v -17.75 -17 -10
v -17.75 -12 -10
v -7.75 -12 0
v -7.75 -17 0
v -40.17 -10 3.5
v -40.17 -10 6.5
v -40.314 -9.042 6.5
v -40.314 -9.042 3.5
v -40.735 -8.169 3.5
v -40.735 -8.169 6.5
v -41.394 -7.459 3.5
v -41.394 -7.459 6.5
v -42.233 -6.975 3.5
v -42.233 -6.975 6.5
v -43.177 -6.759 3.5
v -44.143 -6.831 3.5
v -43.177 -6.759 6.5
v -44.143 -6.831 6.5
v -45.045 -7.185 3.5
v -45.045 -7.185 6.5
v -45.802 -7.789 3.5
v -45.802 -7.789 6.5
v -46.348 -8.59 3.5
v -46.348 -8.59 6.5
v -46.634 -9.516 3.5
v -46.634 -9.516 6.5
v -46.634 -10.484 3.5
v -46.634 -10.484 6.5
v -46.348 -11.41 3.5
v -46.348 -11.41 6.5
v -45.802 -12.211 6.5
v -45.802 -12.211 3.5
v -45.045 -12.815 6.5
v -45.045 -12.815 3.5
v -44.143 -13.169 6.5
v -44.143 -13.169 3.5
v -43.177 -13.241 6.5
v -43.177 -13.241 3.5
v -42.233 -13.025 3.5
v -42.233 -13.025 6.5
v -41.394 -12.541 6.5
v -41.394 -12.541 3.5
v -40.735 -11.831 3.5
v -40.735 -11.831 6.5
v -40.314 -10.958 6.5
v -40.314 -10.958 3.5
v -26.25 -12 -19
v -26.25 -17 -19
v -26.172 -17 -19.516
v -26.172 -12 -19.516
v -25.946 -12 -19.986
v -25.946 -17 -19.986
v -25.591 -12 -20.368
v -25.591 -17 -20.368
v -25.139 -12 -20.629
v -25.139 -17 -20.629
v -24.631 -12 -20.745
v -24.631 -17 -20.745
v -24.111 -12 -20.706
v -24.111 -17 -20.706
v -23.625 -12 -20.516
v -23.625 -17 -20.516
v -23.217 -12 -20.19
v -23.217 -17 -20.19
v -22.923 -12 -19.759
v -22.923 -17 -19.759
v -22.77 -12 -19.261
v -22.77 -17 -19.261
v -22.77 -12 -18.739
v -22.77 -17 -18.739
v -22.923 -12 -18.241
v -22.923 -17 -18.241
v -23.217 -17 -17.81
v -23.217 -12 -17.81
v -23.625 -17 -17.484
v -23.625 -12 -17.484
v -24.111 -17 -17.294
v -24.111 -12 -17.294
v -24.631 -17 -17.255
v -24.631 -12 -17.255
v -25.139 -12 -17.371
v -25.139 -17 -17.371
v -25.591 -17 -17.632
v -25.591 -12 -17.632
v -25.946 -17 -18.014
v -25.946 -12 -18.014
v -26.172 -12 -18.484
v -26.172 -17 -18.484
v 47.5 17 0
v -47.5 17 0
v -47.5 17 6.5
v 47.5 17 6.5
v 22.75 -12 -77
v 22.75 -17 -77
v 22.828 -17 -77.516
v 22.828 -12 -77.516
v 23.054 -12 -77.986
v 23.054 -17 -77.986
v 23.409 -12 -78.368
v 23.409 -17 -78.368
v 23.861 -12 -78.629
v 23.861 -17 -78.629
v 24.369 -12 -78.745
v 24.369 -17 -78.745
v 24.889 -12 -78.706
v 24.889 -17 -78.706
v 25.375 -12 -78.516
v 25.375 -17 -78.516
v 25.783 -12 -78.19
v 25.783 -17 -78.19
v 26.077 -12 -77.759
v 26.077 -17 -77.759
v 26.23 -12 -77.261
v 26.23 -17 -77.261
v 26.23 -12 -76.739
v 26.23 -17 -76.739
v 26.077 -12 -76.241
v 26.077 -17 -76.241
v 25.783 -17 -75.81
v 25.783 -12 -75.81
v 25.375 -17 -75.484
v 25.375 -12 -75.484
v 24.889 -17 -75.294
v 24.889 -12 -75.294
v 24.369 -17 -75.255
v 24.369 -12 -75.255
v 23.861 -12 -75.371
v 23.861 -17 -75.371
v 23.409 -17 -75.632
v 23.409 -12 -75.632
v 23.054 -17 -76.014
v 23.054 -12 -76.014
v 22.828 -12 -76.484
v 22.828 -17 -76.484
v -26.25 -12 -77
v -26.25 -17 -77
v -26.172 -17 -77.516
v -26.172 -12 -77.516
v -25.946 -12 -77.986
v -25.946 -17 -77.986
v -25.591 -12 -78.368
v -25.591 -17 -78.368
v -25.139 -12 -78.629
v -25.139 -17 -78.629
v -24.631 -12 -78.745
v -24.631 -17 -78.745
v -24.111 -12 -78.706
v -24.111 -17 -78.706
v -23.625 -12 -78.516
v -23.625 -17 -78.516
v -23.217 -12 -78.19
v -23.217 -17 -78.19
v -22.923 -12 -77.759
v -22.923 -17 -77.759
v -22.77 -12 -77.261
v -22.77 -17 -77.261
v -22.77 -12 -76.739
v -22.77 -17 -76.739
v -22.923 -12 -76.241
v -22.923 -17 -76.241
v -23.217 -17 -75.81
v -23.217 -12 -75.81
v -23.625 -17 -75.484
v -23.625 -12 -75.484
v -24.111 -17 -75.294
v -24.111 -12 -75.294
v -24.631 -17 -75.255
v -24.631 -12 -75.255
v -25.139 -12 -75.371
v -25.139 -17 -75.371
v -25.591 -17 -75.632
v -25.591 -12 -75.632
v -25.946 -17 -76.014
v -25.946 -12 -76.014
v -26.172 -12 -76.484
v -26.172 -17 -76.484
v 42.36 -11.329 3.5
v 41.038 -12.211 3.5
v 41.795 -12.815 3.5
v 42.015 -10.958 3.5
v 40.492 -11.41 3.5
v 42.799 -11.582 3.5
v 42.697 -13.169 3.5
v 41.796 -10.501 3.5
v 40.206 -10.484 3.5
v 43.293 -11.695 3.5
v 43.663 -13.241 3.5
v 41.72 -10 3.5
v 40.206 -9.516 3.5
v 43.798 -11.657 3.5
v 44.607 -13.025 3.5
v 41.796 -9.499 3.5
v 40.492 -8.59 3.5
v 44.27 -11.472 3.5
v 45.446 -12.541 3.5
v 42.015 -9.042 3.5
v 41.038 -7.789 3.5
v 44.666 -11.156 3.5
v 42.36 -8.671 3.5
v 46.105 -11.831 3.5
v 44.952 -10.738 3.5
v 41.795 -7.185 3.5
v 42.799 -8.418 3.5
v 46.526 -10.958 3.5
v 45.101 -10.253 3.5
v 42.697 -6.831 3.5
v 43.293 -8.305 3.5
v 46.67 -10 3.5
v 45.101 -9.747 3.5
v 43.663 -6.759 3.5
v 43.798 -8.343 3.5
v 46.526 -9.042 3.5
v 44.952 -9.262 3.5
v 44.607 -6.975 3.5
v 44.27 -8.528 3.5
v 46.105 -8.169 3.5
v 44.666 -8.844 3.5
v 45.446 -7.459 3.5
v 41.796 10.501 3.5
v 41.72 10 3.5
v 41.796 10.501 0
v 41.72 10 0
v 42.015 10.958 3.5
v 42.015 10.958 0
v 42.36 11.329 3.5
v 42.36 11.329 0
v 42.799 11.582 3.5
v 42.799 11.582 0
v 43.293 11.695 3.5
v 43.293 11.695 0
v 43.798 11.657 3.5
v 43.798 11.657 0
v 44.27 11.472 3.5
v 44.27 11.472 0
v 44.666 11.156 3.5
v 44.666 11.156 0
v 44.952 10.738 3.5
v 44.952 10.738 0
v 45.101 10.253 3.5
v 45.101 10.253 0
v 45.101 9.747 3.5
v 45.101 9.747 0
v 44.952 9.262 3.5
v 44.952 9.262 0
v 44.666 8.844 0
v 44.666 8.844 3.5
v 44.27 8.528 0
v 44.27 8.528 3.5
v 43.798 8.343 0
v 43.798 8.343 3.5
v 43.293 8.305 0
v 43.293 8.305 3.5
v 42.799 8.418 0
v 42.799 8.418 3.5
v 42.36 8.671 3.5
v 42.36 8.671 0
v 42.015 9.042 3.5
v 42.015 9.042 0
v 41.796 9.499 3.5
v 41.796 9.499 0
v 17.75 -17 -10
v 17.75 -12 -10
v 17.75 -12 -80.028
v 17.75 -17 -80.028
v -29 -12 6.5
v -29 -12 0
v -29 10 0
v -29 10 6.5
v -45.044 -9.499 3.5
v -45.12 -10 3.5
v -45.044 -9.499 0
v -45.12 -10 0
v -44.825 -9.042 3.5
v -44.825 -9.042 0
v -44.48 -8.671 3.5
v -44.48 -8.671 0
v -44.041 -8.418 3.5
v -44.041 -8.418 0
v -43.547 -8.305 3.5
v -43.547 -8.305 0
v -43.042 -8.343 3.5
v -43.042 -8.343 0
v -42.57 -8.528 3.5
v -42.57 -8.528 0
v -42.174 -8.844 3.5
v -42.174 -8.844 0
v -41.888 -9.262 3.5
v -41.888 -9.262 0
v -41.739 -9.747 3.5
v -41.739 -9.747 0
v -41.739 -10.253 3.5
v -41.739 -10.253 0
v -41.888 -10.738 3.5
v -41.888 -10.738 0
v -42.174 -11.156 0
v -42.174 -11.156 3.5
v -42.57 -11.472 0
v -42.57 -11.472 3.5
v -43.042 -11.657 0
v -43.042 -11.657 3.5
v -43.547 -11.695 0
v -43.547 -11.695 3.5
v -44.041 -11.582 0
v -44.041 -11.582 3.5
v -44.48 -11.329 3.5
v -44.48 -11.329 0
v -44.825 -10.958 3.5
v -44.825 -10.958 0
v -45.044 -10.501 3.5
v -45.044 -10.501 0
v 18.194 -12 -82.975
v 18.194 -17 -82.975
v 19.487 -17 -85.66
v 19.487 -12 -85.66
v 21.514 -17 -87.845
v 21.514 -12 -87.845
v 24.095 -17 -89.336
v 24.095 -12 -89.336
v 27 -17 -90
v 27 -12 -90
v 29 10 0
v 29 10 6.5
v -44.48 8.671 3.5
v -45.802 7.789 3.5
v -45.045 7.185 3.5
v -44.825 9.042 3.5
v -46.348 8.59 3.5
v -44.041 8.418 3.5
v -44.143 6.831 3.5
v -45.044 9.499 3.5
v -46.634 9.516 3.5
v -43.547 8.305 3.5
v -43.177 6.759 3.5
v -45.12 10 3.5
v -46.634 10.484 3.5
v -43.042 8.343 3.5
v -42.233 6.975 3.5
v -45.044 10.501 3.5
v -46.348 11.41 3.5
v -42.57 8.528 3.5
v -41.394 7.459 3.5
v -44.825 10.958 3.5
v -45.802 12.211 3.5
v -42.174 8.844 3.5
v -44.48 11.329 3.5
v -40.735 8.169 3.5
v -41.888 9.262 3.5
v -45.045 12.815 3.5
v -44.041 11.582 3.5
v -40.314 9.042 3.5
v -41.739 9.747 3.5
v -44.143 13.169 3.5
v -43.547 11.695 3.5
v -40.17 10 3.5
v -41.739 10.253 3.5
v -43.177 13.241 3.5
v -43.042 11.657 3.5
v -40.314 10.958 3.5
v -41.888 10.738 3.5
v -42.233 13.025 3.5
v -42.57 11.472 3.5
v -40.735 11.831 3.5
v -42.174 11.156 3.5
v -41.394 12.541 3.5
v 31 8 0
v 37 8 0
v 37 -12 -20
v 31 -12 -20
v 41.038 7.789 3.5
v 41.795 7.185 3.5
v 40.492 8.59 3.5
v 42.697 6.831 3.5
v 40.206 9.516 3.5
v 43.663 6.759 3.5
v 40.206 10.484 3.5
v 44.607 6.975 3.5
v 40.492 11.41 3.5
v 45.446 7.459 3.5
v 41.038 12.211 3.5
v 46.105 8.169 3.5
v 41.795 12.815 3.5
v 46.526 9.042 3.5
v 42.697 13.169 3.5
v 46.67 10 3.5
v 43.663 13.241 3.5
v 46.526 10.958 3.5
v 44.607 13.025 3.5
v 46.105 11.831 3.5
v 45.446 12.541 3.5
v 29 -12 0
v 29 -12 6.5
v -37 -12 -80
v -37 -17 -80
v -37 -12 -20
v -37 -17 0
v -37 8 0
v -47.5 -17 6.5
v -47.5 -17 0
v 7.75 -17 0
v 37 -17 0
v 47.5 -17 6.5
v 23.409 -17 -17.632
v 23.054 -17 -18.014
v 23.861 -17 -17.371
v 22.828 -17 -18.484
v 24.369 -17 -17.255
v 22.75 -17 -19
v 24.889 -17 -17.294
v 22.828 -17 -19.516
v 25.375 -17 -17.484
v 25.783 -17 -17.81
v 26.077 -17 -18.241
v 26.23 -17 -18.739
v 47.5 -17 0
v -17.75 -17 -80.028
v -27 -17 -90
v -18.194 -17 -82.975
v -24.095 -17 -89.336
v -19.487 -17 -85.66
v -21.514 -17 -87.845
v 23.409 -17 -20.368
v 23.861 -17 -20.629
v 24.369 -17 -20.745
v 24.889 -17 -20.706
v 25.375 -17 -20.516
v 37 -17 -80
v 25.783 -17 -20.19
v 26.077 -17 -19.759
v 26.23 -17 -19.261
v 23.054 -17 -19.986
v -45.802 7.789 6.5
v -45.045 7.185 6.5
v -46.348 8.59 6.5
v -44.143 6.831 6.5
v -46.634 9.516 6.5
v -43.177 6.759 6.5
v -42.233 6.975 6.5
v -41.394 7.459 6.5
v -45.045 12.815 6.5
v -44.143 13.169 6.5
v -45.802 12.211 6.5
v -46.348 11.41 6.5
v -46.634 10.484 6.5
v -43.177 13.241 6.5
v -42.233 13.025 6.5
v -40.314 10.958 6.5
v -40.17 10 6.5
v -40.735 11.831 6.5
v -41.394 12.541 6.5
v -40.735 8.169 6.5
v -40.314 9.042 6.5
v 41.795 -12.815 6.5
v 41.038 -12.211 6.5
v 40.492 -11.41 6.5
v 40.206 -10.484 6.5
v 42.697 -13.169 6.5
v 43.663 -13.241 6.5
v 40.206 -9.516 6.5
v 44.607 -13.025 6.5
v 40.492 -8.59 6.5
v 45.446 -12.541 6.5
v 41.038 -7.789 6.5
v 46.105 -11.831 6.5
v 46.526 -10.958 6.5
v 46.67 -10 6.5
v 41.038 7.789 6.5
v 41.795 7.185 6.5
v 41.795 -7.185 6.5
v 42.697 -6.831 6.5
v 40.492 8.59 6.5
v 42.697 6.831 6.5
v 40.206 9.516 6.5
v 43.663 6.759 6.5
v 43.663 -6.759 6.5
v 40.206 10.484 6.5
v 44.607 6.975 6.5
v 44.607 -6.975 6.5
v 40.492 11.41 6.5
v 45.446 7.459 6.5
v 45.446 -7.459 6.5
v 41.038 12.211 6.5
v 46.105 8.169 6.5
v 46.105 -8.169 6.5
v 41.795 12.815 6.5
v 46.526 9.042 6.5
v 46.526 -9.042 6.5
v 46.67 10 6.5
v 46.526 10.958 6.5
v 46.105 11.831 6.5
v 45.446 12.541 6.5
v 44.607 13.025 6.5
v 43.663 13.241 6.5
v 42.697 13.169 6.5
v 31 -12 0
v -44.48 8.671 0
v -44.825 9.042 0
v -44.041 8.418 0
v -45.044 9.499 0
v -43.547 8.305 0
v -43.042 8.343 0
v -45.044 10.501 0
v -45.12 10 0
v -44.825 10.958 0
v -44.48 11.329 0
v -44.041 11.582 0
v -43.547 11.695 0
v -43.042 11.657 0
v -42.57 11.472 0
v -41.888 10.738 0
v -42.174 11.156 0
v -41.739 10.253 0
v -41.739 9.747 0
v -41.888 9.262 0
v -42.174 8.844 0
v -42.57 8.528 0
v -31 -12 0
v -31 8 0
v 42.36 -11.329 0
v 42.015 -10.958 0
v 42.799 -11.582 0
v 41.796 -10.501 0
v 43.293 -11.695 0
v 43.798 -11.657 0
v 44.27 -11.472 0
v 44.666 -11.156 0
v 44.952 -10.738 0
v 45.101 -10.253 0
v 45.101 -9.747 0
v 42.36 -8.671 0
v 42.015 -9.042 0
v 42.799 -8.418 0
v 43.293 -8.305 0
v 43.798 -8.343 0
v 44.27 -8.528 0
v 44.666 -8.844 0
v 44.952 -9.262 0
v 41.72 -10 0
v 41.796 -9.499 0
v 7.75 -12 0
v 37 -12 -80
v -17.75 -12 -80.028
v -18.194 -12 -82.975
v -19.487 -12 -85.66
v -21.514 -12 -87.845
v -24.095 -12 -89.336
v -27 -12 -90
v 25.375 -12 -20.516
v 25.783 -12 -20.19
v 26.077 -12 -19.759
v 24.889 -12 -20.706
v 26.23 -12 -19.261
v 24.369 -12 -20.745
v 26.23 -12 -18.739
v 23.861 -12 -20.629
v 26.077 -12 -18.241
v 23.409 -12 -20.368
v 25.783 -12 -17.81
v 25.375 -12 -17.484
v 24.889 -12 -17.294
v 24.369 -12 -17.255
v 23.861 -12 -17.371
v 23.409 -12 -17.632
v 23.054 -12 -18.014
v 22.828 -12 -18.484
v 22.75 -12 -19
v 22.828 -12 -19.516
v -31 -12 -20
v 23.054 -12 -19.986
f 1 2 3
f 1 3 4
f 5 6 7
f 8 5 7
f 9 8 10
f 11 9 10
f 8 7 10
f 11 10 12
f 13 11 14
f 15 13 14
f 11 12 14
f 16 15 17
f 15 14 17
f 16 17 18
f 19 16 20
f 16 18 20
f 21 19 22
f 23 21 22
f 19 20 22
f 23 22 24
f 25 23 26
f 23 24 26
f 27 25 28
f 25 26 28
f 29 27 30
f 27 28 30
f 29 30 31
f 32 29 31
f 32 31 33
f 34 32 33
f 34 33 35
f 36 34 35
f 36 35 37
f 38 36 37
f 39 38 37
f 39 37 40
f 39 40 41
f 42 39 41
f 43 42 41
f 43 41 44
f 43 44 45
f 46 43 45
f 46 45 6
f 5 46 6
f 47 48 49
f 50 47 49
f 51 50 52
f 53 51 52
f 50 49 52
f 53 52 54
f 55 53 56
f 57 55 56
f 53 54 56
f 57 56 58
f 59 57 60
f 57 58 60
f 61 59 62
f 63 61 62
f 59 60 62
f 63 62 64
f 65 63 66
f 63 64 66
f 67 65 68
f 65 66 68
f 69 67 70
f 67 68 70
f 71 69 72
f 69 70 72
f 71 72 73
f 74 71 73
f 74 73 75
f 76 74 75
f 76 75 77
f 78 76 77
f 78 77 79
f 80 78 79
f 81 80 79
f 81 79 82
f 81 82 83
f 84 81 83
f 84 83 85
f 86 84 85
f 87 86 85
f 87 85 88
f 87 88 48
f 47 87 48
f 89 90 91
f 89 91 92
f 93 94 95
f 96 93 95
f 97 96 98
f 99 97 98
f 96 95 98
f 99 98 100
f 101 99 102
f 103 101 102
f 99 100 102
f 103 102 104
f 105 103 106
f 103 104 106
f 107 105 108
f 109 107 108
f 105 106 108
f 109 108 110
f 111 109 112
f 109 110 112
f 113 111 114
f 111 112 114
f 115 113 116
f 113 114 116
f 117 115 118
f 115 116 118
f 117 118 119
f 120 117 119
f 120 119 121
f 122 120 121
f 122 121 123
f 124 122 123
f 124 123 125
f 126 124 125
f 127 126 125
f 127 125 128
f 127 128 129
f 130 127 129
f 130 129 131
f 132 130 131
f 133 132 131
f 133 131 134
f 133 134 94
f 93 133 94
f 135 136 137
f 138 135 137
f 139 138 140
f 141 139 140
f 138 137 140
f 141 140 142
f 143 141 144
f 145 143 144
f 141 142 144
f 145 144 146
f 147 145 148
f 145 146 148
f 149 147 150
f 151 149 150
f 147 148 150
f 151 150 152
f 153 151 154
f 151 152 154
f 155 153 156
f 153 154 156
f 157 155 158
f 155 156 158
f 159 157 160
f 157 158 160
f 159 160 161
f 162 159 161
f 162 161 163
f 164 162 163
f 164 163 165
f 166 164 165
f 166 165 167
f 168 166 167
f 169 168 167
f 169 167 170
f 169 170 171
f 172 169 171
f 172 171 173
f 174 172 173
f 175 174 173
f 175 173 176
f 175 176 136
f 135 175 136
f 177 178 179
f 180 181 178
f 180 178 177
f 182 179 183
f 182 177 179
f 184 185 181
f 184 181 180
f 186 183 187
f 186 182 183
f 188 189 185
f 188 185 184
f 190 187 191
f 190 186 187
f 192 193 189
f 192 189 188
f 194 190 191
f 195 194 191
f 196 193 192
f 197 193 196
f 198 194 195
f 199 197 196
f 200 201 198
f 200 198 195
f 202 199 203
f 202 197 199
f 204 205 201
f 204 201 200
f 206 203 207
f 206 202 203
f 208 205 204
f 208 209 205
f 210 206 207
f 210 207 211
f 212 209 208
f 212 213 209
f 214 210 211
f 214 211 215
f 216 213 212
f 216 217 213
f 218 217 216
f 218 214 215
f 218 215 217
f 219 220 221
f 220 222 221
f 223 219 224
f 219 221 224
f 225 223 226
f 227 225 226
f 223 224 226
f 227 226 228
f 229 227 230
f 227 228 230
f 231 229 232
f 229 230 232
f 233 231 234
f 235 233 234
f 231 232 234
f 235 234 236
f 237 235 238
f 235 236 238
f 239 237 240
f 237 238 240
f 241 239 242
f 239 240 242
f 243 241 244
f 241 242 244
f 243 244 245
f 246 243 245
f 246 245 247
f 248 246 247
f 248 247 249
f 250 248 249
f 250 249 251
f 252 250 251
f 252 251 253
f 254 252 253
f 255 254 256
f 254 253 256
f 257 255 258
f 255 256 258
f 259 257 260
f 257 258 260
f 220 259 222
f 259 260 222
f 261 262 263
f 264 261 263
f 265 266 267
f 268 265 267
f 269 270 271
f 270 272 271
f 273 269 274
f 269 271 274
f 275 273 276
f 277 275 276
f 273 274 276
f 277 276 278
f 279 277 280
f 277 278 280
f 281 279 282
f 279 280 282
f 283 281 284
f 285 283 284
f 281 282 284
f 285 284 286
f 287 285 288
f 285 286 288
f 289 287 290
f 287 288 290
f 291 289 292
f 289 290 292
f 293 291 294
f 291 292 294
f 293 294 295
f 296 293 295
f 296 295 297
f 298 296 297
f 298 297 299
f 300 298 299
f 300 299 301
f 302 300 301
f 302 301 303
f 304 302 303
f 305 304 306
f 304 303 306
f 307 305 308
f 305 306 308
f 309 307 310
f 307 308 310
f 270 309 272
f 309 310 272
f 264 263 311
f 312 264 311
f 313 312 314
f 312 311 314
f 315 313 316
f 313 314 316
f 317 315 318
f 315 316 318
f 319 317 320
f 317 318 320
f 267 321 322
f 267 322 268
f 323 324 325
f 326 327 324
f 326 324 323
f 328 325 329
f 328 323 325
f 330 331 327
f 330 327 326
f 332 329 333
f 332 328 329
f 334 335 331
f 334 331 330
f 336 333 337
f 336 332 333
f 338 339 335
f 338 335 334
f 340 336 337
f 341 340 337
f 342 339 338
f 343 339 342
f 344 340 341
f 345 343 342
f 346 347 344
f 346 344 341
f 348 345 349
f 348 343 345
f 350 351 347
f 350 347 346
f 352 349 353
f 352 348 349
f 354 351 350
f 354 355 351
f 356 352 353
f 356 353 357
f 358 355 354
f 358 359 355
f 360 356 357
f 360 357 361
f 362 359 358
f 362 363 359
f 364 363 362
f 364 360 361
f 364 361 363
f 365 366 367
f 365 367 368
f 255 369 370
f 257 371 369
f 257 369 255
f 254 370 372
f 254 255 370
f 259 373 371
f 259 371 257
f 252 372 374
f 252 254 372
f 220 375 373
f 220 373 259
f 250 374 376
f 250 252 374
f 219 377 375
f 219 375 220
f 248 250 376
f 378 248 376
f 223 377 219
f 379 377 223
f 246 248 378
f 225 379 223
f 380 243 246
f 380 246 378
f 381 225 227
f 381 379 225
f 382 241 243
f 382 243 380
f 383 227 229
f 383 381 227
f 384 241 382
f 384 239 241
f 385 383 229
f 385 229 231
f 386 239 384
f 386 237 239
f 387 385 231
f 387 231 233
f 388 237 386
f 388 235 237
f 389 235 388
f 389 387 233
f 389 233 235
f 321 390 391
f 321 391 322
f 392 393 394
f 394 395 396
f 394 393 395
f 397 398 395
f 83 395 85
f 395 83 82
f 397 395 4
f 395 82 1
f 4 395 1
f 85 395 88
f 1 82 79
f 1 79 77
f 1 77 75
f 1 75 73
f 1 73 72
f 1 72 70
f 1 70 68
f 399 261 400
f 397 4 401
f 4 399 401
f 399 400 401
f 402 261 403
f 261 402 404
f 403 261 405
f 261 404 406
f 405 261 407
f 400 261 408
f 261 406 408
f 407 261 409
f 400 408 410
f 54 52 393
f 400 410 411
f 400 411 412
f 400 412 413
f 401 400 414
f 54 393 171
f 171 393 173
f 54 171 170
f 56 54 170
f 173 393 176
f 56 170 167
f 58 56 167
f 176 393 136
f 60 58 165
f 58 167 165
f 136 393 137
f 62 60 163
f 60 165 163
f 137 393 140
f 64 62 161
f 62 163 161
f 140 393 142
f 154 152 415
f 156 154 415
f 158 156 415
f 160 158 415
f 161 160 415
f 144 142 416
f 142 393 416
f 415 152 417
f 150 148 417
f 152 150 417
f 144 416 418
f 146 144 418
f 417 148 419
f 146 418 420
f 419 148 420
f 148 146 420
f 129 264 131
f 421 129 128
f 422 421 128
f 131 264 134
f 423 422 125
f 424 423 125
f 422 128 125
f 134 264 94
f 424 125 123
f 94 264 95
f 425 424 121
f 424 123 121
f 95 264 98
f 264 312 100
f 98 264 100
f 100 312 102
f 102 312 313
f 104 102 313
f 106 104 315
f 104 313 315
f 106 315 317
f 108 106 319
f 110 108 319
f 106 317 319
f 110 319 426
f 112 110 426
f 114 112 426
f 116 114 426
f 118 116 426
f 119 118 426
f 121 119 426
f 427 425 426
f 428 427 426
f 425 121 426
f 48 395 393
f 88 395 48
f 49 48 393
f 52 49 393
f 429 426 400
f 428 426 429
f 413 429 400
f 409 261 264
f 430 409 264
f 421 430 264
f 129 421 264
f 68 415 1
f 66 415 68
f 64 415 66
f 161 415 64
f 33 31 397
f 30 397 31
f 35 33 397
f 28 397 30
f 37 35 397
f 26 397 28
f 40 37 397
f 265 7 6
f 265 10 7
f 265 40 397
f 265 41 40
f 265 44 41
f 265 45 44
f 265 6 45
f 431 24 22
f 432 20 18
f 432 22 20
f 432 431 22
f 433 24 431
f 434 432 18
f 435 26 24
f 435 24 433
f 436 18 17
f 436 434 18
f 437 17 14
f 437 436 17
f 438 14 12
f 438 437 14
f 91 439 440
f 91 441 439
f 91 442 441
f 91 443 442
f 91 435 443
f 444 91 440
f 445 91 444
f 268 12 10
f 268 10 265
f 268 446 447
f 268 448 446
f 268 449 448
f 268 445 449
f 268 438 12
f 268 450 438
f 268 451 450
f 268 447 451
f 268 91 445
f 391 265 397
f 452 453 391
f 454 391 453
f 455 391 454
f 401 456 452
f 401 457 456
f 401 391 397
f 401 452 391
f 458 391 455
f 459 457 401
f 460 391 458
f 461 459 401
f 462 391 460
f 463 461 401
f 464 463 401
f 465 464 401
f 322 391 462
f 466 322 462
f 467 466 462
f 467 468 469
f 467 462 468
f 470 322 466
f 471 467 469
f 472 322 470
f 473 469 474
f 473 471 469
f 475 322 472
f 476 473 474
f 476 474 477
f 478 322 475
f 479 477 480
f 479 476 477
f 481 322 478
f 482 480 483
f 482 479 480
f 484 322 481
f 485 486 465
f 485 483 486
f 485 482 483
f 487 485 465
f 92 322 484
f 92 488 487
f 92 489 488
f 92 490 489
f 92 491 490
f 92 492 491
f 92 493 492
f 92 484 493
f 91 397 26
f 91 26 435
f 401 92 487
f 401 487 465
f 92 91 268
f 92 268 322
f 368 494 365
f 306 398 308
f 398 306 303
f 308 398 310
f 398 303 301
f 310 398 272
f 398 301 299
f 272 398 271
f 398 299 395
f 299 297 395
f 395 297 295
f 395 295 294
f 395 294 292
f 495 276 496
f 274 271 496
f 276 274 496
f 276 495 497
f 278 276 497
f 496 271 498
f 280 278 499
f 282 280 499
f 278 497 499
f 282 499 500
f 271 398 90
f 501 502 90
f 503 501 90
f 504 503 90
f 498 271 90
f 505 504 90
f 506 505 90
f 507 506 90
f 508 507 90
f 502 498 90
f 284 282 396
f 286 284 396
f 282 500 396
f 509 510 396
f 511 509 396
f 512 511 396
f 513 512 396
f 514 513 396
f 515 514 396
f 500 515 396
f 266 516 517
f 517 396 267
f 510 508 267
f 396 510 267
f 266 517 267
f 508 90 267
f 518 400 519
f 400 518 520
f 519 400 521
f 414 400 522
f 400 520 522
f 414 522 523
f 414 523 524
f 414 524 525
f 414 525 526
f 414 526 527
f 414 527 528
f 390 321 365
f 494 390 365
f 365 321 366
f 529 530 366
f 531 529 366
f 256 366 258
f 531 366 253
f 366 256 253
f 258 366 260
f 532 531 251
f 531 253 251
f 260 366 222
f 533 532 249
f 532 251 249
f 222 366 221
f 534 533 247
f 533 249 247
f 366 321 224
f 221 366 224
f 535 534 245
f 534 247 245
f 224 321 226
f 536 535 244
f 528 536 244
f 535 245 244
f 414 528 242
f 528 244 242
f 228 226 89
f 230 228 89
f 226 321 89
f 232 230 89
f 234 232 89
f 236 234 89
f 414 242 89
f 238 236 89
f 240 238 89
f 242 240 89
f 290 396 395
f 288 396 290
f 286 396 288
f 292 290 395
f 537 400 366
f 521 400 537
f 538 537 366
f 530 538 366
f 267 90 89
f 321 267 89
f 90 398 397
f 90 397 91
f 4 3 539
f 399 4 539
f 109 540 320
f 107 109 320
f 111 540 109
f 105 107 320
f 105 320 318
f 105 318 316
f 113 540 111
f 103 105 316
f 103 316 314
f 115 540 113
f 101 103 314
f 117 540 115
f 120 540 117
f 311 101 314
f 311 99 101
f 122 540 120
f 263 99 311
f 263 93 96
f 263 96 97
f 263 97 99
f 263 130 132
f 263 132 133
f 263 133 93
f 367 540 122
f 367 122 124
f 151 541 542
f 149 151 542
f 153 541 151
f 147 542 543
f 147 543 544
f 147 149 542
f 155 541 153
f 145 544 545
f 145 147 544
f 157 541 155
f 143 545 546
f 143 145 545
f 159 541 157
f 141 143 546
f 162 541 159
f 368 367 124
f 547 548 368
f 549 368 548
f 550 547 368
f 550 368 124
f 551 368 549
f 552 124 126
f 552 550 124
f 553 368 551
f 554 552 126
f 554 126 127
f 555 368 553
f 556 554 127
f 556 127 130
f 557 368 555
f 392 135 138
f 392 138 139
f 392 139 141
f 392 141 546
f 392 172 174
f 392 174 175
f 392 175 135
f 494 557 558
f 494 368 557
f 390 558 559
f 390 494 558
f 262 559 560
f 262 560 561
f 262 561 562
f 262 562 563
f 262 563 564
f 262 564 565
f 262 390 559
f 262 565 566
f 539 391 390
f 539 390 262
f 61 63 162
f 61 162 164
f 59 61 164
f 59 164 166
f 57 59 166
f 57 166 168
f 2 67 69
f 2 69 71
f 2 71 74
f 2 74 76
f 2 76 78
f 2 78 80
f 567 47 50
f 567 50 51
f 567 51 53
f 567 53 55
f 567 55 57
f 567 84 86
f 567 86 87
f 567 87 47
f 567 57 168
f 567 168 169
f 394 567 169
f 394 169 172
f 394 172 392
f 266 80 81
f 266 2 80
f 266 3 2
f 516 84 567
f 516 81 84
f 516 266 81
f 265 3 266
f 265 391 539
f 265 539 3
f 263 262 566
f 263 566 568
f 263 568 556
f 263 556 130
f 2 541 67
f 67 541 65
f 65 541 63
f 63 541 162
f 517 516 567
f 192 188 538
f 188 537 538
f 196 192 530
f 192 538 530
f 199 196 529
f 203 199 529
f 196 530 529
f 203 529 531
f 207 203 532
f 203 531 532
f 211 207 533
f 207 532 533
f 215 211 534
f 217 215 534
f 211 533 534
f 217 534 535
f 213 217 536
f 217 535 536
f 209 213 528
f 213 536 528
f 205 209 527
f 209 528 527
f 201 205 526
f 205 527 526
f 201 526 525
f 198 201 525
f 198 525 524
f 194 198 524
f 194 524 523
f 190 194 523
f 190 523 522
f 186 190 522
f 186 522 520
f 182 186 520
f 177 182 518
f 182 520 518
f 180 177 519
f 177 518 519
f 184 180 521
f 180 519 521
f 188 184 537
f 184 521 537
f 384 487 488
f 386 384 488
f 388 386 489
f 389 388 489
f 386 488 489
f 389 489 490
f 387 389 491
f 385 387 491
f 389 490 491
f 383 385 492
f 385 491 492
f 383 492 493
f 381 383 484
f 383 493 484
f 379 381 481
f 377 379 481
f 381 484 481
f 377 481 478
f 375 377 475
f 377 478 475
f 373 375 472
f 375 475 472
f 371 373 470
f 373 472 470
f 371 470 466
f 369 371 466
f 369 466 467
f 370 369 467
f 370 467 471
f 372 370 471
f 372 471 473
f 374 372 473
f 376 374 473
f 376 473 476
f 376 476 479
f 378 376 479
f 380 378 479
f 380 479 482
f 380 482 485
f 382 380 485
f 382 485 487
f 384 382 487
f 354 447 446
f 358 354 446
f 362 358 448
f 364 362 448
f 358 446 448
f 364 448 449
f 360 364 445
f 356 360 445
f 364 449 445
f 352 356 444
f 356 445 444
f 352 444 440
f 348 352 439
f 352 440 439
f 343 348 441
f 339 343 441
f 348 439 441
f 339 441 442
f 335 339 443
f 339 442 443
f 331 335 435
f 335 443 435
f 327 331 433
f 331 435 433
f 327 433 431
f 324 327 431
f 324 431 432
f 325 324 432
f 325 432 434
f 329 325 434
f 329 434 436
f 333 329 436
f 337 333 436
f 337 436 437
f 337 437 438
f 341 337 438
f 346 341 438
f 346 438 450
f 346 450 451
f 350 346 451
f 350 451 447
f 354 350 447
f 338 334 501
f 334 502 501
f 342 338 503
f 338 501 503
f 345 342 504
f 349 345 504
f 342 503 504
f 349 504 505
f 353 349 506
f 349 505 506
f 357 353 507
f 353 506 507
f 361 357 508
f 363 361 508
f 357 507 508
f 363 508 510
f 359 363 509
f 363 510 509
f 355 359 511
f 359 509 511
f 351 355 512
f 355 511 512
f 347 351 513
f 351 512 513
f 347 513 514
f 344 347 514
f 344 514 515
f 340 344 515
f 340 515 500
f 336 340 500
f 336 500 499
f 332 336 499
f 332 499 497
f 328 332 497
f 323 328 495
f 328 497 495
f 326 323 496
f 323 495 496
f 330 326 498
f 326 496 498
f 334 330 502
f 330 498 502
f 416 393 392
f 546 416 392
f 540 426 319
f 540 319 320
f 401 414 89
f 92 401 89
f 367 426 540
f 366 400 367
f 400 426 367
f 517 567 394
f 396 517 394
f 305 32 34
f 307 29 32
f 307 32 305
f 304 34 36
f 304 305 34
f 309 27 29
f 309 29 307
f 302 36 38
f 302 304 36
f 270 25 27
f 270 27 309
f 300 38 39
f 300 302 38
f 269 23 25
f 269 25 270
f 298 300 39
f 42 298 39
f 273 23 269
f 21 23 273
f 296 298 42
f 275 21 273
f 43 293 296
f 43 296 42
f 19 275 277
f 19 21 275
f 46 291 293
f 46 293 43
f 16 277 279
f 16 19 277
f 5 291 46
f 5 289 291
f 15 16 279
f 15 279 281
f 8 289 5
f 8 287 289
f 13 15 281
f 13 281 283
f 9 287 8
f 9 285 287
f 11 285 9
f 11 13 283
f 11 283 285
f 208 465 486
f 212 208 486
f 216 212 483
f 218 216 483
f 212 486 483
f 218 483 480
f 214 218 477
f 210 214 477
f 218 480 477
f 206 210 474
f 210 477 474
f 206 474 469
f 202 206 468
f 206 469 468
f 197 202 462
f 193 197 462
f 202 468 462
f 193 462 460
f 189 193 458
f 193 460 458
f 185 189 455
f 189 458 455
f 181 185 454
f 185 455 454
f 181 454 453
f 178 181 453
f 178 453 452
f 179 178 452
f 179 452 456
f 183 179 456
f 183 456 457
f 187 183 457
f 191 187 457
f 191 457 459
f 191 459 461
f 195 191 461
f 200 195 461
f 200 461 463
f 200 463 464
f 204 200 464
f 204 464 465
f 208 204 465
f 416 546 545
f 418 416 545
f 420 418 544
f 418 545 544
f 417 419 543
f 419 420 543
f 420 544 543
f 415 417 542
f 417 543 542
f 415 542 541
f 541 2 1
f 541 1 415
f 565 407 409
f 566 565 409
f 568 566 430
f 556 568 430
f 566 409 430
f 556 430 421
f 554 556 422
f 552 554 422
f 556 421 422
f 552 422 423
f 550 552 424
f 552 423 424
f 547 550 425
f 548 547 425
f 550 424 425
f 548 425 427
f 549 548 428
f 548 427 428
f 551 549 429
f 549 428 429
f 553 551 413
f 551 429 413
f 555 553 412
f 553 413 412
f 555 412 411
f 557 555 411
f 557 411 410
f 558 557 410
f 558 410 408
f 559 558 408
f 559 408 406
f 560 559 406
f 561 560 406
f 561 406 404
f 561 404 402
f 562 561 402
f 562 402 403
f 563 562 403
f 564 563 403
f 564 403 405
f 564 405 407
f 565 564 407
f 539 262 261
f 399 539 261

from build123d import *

# Parameters (mm, degrees)
SKETCH1_W                      = 95
SKETCH1_H                      = 34
BOSS_EXTRUDE1_DEPTH            = 6.5
SKETCH2_W                      = 74
SKETCH2_H                      = 5
BOSS_EXTRUDE2_DEPTH            = 90
SKETCH3_W                      = 58
SKETCH3_H                      = 22
CUT_EXTRUDE1_DEPTH             = 90
CBORE_FOR_M3_SHCS1_D           = 3.4
CBORE_FOR_M3_SHCS1_DEPTH       = 10.1
CBORE_FOR_M3_SHCS1_CBORE_D     = 6.5
CBORE_FOR_M3_SHCS1_CBORE_DEPTH = 3
CBORE_FOR_M3_SHCS1_TIP         = 1.021463052
SKETCH7_W                      = 6
SKETCH7_H                      = 20
BOSS_EXTRUDE3_DEPTH            = 20
CHAMFER1_SIZE                  = 20
F_1_0_3_5_DIAMETER_HOLE1_D     = 3.5
F_1_0_3_5_DIAMETER_HOLE1_DEPTH = 10.1
F_1_0_3_5_DIAMETER_HOLE1_TIP   = 1.051506083
SKETCH12_W                     = 35.5
SKETCH12_H                     = 90
CUT_EXTRUDE2_DEPTH             = 20
CHAMFER2_SIZE                  = 10
FILLET1_R                      = 10


# Some blends are built 0.0001 mm under size
with BuildPart() as part:
    # Sketch1 → Boss-Extrude1 (new body)
    with BuildSketch(Plane.XY):
        Rectangle(SKETCH1_W, SKETCH1_H)
    extrude(amount=BOSS_EXTRUDE1_DEPTH)

    # Sketch2 → Boss-Extrude2 (add)
    with BuildSketch(Plane(origin=(0, 0, 0), x_dir=(-1, 0, 0), z_dir=(0, 0, -1))):
        with Locations((0, -14.5)):
            Rectangle(SKETCH2_W, SKETCH2_H)
    extrude(amount=BOSS_EXTRUDE2_DEPTH)

    # Sketch3 → Cut-Extrude1 (cut)
    with BuildSketch(Plane(origin=(0, 0, 0), x_dir=(-1, 0, 0), z_dir=(0, 0, -1))):
        with Locations((0, -1)):
            Rectangle(SKETCH3_W, SKETCH3_H)
    extrude(amount=-CUT_EXTRUDE1_DEPTH, mode=Mode.SUBTRACT)

    # CBORE for M3 SHCS1
    with Locations(Plane.XY.offset(6.5)):
        with Locations((-43.42, 10), (-43.42, -10), (43.42, 10), (43.42, -10)):
            CounterBoreHole(CBORE_FOR_M3_SHCS1_D / 2, CBORE_FOR_M3_SHCS1_CBORE_D / 2, CBORE_FOR_M3_SHCS1_CBORE_DEPTH, depth=CBORE_FOR_M3_SHCS1_DEPTH)
            with Locations((0, 0, -(CBORE_FOR_M3_SHCS1_DEPTH + CBORE_FOR_M3_SHCS1_TIP / 2))):  # 118° drill point
                Cone(0, CBORE_FOR_M3_SHCS1_D / 2, CBORE_FOR_M3_SHCS1_TIP, mode=Mode.SUBTRACT)

    # Sketch7 → Boss-Extrude3 (add)
    with BuildSketch(Plane(origin=(0, 0, 0), x_dir=(-1, 0, 0), z_dir=(0, 0, -1))):
        with Locations((-34, -2)):
            Rectangle(SKETCH7_W, SKETCH7_H)
        with Locations((34, -2)):
            Rectangle(SKETCH7_W, SKETCH7_H)
    extrude(amount=BOSS_EXTRUDE3_DEPTH)

    # Chamfer1
    chamfer1_edges = [part.edges().sort_by_distance(p)[0] for p in [
        (34, 8, -20),
        (-34, 8, -20),
    ]]
    chamfer(chamfer1_edges, length=CHAMFER1_SIZE - 0.0001)  # a hair under: the kernel refuses the full size

    # Ø1.0 (3.5) Diameter Hole1
    with Locations(Plane(origin=(0, -12, 0), x_dir=(1, 0, 0), z_dir=(0, 1, 0))):
        with Locations((-24.5, 77), (24.5, 77), (-24.5, 19), (24.5, 19)):
            Hole(F_1_0_3_5_DIAMETER_HOLE1_D / 2, depth=F_1_0_3_5_DIAMETER_HOLE1_DEPTH)
            with Locations((0, 0, -(F_1_0_3_5_DIAMETER_HOLE1_DEPTH + F_1_0_3_5_DIAMETER_HOLE1_TIP / 2))):  # 118° drill point
                Cone(0, F_1_0_3_5_DIAMETER_HOLE1_D / 2, F_1_0_3_5_DIAMETER_HOLE1_TIP, mode=Mode.SUBTRACT)

    # Sketch12 → Cut-Extrude2 (cut)
    with BuildSketch(Plane(origin=(0, -12, 0), x_dir=(1, 0, 0), z_dir=(0, 1, 0))):
        with Locations((0, 45)):
            Rectangle(SKETCH12_W, SKETCH12_H)
    extrude(amount=-CUT_EXTRUDE2_DEPTH, mode=Mode.SUBTRACT)

    # Chamfer2
    chamfer2_edges = [part.edges().sort_by_distance(p)[0] for p in [
        (17.75, -14.5, 0),
        (-17.75, -14.5, 0),
        (37, -14.5, -90),
        (-37, -14.5, -90),
    ]]
    chamfer(chamfer2_edges, length=CHAMFER2_SIZE)

    # Fillet1
    # the kernel refuses this fillet: 10 mm, written as the material it takes off along each edge
    with BuildSketch(Plane(origin=(-17.75, 12.929588344, -90), x_dir=(0, 0, 1), z_dir=(0, -1, 0))) as fillet1_piece_1:
        with BuildLine():
            CenterArc((9.971835338, 10), FILLET1_R, 184.301222305, 85.698777695)
            Line((0, 9.25), (-0.199436707, 9.235))
            ThreePointArc((-0.199436707, 9.235), (-0.2, 4.625), (-0.2, 0))
            Line((-0.2, 0), (0, -0.2))
            Line((0, -0.2), (9.971835338, -0.2))
            Line((9.971835338, -0.2), (9.971835338, 0))
        make_face()
    extrude(amount=54.859176688, mode=Mode.SUBTRACT)
    with BuildSketch(Plane(origin=(17.75, 12.929588344, -90), x_dir=(1, 0, 0), z_dir=(0, -1, 0))) as fillet1_piece_2:
        with BuildLine():
            CenterArc((10, 9.971835338), FILLET1_R, 180, 85.698777695)
            Line((0, 9.971835338), (-0.2, 9.971835338))
            Line((-0.2, 9.971835338), (-0.2, 0))
            Line((-0.2, 0), (0, -0.2))
            ThreePointArc((0, -0.2), (4.625, -0.2), (9.235, -0.199436707))
            Line((9.235, -0.199436707), (9.25, 0))
        make_face()
    extrude(amount=54.859176688, mode=Mode.SUBTRACT)


solid = part.part
